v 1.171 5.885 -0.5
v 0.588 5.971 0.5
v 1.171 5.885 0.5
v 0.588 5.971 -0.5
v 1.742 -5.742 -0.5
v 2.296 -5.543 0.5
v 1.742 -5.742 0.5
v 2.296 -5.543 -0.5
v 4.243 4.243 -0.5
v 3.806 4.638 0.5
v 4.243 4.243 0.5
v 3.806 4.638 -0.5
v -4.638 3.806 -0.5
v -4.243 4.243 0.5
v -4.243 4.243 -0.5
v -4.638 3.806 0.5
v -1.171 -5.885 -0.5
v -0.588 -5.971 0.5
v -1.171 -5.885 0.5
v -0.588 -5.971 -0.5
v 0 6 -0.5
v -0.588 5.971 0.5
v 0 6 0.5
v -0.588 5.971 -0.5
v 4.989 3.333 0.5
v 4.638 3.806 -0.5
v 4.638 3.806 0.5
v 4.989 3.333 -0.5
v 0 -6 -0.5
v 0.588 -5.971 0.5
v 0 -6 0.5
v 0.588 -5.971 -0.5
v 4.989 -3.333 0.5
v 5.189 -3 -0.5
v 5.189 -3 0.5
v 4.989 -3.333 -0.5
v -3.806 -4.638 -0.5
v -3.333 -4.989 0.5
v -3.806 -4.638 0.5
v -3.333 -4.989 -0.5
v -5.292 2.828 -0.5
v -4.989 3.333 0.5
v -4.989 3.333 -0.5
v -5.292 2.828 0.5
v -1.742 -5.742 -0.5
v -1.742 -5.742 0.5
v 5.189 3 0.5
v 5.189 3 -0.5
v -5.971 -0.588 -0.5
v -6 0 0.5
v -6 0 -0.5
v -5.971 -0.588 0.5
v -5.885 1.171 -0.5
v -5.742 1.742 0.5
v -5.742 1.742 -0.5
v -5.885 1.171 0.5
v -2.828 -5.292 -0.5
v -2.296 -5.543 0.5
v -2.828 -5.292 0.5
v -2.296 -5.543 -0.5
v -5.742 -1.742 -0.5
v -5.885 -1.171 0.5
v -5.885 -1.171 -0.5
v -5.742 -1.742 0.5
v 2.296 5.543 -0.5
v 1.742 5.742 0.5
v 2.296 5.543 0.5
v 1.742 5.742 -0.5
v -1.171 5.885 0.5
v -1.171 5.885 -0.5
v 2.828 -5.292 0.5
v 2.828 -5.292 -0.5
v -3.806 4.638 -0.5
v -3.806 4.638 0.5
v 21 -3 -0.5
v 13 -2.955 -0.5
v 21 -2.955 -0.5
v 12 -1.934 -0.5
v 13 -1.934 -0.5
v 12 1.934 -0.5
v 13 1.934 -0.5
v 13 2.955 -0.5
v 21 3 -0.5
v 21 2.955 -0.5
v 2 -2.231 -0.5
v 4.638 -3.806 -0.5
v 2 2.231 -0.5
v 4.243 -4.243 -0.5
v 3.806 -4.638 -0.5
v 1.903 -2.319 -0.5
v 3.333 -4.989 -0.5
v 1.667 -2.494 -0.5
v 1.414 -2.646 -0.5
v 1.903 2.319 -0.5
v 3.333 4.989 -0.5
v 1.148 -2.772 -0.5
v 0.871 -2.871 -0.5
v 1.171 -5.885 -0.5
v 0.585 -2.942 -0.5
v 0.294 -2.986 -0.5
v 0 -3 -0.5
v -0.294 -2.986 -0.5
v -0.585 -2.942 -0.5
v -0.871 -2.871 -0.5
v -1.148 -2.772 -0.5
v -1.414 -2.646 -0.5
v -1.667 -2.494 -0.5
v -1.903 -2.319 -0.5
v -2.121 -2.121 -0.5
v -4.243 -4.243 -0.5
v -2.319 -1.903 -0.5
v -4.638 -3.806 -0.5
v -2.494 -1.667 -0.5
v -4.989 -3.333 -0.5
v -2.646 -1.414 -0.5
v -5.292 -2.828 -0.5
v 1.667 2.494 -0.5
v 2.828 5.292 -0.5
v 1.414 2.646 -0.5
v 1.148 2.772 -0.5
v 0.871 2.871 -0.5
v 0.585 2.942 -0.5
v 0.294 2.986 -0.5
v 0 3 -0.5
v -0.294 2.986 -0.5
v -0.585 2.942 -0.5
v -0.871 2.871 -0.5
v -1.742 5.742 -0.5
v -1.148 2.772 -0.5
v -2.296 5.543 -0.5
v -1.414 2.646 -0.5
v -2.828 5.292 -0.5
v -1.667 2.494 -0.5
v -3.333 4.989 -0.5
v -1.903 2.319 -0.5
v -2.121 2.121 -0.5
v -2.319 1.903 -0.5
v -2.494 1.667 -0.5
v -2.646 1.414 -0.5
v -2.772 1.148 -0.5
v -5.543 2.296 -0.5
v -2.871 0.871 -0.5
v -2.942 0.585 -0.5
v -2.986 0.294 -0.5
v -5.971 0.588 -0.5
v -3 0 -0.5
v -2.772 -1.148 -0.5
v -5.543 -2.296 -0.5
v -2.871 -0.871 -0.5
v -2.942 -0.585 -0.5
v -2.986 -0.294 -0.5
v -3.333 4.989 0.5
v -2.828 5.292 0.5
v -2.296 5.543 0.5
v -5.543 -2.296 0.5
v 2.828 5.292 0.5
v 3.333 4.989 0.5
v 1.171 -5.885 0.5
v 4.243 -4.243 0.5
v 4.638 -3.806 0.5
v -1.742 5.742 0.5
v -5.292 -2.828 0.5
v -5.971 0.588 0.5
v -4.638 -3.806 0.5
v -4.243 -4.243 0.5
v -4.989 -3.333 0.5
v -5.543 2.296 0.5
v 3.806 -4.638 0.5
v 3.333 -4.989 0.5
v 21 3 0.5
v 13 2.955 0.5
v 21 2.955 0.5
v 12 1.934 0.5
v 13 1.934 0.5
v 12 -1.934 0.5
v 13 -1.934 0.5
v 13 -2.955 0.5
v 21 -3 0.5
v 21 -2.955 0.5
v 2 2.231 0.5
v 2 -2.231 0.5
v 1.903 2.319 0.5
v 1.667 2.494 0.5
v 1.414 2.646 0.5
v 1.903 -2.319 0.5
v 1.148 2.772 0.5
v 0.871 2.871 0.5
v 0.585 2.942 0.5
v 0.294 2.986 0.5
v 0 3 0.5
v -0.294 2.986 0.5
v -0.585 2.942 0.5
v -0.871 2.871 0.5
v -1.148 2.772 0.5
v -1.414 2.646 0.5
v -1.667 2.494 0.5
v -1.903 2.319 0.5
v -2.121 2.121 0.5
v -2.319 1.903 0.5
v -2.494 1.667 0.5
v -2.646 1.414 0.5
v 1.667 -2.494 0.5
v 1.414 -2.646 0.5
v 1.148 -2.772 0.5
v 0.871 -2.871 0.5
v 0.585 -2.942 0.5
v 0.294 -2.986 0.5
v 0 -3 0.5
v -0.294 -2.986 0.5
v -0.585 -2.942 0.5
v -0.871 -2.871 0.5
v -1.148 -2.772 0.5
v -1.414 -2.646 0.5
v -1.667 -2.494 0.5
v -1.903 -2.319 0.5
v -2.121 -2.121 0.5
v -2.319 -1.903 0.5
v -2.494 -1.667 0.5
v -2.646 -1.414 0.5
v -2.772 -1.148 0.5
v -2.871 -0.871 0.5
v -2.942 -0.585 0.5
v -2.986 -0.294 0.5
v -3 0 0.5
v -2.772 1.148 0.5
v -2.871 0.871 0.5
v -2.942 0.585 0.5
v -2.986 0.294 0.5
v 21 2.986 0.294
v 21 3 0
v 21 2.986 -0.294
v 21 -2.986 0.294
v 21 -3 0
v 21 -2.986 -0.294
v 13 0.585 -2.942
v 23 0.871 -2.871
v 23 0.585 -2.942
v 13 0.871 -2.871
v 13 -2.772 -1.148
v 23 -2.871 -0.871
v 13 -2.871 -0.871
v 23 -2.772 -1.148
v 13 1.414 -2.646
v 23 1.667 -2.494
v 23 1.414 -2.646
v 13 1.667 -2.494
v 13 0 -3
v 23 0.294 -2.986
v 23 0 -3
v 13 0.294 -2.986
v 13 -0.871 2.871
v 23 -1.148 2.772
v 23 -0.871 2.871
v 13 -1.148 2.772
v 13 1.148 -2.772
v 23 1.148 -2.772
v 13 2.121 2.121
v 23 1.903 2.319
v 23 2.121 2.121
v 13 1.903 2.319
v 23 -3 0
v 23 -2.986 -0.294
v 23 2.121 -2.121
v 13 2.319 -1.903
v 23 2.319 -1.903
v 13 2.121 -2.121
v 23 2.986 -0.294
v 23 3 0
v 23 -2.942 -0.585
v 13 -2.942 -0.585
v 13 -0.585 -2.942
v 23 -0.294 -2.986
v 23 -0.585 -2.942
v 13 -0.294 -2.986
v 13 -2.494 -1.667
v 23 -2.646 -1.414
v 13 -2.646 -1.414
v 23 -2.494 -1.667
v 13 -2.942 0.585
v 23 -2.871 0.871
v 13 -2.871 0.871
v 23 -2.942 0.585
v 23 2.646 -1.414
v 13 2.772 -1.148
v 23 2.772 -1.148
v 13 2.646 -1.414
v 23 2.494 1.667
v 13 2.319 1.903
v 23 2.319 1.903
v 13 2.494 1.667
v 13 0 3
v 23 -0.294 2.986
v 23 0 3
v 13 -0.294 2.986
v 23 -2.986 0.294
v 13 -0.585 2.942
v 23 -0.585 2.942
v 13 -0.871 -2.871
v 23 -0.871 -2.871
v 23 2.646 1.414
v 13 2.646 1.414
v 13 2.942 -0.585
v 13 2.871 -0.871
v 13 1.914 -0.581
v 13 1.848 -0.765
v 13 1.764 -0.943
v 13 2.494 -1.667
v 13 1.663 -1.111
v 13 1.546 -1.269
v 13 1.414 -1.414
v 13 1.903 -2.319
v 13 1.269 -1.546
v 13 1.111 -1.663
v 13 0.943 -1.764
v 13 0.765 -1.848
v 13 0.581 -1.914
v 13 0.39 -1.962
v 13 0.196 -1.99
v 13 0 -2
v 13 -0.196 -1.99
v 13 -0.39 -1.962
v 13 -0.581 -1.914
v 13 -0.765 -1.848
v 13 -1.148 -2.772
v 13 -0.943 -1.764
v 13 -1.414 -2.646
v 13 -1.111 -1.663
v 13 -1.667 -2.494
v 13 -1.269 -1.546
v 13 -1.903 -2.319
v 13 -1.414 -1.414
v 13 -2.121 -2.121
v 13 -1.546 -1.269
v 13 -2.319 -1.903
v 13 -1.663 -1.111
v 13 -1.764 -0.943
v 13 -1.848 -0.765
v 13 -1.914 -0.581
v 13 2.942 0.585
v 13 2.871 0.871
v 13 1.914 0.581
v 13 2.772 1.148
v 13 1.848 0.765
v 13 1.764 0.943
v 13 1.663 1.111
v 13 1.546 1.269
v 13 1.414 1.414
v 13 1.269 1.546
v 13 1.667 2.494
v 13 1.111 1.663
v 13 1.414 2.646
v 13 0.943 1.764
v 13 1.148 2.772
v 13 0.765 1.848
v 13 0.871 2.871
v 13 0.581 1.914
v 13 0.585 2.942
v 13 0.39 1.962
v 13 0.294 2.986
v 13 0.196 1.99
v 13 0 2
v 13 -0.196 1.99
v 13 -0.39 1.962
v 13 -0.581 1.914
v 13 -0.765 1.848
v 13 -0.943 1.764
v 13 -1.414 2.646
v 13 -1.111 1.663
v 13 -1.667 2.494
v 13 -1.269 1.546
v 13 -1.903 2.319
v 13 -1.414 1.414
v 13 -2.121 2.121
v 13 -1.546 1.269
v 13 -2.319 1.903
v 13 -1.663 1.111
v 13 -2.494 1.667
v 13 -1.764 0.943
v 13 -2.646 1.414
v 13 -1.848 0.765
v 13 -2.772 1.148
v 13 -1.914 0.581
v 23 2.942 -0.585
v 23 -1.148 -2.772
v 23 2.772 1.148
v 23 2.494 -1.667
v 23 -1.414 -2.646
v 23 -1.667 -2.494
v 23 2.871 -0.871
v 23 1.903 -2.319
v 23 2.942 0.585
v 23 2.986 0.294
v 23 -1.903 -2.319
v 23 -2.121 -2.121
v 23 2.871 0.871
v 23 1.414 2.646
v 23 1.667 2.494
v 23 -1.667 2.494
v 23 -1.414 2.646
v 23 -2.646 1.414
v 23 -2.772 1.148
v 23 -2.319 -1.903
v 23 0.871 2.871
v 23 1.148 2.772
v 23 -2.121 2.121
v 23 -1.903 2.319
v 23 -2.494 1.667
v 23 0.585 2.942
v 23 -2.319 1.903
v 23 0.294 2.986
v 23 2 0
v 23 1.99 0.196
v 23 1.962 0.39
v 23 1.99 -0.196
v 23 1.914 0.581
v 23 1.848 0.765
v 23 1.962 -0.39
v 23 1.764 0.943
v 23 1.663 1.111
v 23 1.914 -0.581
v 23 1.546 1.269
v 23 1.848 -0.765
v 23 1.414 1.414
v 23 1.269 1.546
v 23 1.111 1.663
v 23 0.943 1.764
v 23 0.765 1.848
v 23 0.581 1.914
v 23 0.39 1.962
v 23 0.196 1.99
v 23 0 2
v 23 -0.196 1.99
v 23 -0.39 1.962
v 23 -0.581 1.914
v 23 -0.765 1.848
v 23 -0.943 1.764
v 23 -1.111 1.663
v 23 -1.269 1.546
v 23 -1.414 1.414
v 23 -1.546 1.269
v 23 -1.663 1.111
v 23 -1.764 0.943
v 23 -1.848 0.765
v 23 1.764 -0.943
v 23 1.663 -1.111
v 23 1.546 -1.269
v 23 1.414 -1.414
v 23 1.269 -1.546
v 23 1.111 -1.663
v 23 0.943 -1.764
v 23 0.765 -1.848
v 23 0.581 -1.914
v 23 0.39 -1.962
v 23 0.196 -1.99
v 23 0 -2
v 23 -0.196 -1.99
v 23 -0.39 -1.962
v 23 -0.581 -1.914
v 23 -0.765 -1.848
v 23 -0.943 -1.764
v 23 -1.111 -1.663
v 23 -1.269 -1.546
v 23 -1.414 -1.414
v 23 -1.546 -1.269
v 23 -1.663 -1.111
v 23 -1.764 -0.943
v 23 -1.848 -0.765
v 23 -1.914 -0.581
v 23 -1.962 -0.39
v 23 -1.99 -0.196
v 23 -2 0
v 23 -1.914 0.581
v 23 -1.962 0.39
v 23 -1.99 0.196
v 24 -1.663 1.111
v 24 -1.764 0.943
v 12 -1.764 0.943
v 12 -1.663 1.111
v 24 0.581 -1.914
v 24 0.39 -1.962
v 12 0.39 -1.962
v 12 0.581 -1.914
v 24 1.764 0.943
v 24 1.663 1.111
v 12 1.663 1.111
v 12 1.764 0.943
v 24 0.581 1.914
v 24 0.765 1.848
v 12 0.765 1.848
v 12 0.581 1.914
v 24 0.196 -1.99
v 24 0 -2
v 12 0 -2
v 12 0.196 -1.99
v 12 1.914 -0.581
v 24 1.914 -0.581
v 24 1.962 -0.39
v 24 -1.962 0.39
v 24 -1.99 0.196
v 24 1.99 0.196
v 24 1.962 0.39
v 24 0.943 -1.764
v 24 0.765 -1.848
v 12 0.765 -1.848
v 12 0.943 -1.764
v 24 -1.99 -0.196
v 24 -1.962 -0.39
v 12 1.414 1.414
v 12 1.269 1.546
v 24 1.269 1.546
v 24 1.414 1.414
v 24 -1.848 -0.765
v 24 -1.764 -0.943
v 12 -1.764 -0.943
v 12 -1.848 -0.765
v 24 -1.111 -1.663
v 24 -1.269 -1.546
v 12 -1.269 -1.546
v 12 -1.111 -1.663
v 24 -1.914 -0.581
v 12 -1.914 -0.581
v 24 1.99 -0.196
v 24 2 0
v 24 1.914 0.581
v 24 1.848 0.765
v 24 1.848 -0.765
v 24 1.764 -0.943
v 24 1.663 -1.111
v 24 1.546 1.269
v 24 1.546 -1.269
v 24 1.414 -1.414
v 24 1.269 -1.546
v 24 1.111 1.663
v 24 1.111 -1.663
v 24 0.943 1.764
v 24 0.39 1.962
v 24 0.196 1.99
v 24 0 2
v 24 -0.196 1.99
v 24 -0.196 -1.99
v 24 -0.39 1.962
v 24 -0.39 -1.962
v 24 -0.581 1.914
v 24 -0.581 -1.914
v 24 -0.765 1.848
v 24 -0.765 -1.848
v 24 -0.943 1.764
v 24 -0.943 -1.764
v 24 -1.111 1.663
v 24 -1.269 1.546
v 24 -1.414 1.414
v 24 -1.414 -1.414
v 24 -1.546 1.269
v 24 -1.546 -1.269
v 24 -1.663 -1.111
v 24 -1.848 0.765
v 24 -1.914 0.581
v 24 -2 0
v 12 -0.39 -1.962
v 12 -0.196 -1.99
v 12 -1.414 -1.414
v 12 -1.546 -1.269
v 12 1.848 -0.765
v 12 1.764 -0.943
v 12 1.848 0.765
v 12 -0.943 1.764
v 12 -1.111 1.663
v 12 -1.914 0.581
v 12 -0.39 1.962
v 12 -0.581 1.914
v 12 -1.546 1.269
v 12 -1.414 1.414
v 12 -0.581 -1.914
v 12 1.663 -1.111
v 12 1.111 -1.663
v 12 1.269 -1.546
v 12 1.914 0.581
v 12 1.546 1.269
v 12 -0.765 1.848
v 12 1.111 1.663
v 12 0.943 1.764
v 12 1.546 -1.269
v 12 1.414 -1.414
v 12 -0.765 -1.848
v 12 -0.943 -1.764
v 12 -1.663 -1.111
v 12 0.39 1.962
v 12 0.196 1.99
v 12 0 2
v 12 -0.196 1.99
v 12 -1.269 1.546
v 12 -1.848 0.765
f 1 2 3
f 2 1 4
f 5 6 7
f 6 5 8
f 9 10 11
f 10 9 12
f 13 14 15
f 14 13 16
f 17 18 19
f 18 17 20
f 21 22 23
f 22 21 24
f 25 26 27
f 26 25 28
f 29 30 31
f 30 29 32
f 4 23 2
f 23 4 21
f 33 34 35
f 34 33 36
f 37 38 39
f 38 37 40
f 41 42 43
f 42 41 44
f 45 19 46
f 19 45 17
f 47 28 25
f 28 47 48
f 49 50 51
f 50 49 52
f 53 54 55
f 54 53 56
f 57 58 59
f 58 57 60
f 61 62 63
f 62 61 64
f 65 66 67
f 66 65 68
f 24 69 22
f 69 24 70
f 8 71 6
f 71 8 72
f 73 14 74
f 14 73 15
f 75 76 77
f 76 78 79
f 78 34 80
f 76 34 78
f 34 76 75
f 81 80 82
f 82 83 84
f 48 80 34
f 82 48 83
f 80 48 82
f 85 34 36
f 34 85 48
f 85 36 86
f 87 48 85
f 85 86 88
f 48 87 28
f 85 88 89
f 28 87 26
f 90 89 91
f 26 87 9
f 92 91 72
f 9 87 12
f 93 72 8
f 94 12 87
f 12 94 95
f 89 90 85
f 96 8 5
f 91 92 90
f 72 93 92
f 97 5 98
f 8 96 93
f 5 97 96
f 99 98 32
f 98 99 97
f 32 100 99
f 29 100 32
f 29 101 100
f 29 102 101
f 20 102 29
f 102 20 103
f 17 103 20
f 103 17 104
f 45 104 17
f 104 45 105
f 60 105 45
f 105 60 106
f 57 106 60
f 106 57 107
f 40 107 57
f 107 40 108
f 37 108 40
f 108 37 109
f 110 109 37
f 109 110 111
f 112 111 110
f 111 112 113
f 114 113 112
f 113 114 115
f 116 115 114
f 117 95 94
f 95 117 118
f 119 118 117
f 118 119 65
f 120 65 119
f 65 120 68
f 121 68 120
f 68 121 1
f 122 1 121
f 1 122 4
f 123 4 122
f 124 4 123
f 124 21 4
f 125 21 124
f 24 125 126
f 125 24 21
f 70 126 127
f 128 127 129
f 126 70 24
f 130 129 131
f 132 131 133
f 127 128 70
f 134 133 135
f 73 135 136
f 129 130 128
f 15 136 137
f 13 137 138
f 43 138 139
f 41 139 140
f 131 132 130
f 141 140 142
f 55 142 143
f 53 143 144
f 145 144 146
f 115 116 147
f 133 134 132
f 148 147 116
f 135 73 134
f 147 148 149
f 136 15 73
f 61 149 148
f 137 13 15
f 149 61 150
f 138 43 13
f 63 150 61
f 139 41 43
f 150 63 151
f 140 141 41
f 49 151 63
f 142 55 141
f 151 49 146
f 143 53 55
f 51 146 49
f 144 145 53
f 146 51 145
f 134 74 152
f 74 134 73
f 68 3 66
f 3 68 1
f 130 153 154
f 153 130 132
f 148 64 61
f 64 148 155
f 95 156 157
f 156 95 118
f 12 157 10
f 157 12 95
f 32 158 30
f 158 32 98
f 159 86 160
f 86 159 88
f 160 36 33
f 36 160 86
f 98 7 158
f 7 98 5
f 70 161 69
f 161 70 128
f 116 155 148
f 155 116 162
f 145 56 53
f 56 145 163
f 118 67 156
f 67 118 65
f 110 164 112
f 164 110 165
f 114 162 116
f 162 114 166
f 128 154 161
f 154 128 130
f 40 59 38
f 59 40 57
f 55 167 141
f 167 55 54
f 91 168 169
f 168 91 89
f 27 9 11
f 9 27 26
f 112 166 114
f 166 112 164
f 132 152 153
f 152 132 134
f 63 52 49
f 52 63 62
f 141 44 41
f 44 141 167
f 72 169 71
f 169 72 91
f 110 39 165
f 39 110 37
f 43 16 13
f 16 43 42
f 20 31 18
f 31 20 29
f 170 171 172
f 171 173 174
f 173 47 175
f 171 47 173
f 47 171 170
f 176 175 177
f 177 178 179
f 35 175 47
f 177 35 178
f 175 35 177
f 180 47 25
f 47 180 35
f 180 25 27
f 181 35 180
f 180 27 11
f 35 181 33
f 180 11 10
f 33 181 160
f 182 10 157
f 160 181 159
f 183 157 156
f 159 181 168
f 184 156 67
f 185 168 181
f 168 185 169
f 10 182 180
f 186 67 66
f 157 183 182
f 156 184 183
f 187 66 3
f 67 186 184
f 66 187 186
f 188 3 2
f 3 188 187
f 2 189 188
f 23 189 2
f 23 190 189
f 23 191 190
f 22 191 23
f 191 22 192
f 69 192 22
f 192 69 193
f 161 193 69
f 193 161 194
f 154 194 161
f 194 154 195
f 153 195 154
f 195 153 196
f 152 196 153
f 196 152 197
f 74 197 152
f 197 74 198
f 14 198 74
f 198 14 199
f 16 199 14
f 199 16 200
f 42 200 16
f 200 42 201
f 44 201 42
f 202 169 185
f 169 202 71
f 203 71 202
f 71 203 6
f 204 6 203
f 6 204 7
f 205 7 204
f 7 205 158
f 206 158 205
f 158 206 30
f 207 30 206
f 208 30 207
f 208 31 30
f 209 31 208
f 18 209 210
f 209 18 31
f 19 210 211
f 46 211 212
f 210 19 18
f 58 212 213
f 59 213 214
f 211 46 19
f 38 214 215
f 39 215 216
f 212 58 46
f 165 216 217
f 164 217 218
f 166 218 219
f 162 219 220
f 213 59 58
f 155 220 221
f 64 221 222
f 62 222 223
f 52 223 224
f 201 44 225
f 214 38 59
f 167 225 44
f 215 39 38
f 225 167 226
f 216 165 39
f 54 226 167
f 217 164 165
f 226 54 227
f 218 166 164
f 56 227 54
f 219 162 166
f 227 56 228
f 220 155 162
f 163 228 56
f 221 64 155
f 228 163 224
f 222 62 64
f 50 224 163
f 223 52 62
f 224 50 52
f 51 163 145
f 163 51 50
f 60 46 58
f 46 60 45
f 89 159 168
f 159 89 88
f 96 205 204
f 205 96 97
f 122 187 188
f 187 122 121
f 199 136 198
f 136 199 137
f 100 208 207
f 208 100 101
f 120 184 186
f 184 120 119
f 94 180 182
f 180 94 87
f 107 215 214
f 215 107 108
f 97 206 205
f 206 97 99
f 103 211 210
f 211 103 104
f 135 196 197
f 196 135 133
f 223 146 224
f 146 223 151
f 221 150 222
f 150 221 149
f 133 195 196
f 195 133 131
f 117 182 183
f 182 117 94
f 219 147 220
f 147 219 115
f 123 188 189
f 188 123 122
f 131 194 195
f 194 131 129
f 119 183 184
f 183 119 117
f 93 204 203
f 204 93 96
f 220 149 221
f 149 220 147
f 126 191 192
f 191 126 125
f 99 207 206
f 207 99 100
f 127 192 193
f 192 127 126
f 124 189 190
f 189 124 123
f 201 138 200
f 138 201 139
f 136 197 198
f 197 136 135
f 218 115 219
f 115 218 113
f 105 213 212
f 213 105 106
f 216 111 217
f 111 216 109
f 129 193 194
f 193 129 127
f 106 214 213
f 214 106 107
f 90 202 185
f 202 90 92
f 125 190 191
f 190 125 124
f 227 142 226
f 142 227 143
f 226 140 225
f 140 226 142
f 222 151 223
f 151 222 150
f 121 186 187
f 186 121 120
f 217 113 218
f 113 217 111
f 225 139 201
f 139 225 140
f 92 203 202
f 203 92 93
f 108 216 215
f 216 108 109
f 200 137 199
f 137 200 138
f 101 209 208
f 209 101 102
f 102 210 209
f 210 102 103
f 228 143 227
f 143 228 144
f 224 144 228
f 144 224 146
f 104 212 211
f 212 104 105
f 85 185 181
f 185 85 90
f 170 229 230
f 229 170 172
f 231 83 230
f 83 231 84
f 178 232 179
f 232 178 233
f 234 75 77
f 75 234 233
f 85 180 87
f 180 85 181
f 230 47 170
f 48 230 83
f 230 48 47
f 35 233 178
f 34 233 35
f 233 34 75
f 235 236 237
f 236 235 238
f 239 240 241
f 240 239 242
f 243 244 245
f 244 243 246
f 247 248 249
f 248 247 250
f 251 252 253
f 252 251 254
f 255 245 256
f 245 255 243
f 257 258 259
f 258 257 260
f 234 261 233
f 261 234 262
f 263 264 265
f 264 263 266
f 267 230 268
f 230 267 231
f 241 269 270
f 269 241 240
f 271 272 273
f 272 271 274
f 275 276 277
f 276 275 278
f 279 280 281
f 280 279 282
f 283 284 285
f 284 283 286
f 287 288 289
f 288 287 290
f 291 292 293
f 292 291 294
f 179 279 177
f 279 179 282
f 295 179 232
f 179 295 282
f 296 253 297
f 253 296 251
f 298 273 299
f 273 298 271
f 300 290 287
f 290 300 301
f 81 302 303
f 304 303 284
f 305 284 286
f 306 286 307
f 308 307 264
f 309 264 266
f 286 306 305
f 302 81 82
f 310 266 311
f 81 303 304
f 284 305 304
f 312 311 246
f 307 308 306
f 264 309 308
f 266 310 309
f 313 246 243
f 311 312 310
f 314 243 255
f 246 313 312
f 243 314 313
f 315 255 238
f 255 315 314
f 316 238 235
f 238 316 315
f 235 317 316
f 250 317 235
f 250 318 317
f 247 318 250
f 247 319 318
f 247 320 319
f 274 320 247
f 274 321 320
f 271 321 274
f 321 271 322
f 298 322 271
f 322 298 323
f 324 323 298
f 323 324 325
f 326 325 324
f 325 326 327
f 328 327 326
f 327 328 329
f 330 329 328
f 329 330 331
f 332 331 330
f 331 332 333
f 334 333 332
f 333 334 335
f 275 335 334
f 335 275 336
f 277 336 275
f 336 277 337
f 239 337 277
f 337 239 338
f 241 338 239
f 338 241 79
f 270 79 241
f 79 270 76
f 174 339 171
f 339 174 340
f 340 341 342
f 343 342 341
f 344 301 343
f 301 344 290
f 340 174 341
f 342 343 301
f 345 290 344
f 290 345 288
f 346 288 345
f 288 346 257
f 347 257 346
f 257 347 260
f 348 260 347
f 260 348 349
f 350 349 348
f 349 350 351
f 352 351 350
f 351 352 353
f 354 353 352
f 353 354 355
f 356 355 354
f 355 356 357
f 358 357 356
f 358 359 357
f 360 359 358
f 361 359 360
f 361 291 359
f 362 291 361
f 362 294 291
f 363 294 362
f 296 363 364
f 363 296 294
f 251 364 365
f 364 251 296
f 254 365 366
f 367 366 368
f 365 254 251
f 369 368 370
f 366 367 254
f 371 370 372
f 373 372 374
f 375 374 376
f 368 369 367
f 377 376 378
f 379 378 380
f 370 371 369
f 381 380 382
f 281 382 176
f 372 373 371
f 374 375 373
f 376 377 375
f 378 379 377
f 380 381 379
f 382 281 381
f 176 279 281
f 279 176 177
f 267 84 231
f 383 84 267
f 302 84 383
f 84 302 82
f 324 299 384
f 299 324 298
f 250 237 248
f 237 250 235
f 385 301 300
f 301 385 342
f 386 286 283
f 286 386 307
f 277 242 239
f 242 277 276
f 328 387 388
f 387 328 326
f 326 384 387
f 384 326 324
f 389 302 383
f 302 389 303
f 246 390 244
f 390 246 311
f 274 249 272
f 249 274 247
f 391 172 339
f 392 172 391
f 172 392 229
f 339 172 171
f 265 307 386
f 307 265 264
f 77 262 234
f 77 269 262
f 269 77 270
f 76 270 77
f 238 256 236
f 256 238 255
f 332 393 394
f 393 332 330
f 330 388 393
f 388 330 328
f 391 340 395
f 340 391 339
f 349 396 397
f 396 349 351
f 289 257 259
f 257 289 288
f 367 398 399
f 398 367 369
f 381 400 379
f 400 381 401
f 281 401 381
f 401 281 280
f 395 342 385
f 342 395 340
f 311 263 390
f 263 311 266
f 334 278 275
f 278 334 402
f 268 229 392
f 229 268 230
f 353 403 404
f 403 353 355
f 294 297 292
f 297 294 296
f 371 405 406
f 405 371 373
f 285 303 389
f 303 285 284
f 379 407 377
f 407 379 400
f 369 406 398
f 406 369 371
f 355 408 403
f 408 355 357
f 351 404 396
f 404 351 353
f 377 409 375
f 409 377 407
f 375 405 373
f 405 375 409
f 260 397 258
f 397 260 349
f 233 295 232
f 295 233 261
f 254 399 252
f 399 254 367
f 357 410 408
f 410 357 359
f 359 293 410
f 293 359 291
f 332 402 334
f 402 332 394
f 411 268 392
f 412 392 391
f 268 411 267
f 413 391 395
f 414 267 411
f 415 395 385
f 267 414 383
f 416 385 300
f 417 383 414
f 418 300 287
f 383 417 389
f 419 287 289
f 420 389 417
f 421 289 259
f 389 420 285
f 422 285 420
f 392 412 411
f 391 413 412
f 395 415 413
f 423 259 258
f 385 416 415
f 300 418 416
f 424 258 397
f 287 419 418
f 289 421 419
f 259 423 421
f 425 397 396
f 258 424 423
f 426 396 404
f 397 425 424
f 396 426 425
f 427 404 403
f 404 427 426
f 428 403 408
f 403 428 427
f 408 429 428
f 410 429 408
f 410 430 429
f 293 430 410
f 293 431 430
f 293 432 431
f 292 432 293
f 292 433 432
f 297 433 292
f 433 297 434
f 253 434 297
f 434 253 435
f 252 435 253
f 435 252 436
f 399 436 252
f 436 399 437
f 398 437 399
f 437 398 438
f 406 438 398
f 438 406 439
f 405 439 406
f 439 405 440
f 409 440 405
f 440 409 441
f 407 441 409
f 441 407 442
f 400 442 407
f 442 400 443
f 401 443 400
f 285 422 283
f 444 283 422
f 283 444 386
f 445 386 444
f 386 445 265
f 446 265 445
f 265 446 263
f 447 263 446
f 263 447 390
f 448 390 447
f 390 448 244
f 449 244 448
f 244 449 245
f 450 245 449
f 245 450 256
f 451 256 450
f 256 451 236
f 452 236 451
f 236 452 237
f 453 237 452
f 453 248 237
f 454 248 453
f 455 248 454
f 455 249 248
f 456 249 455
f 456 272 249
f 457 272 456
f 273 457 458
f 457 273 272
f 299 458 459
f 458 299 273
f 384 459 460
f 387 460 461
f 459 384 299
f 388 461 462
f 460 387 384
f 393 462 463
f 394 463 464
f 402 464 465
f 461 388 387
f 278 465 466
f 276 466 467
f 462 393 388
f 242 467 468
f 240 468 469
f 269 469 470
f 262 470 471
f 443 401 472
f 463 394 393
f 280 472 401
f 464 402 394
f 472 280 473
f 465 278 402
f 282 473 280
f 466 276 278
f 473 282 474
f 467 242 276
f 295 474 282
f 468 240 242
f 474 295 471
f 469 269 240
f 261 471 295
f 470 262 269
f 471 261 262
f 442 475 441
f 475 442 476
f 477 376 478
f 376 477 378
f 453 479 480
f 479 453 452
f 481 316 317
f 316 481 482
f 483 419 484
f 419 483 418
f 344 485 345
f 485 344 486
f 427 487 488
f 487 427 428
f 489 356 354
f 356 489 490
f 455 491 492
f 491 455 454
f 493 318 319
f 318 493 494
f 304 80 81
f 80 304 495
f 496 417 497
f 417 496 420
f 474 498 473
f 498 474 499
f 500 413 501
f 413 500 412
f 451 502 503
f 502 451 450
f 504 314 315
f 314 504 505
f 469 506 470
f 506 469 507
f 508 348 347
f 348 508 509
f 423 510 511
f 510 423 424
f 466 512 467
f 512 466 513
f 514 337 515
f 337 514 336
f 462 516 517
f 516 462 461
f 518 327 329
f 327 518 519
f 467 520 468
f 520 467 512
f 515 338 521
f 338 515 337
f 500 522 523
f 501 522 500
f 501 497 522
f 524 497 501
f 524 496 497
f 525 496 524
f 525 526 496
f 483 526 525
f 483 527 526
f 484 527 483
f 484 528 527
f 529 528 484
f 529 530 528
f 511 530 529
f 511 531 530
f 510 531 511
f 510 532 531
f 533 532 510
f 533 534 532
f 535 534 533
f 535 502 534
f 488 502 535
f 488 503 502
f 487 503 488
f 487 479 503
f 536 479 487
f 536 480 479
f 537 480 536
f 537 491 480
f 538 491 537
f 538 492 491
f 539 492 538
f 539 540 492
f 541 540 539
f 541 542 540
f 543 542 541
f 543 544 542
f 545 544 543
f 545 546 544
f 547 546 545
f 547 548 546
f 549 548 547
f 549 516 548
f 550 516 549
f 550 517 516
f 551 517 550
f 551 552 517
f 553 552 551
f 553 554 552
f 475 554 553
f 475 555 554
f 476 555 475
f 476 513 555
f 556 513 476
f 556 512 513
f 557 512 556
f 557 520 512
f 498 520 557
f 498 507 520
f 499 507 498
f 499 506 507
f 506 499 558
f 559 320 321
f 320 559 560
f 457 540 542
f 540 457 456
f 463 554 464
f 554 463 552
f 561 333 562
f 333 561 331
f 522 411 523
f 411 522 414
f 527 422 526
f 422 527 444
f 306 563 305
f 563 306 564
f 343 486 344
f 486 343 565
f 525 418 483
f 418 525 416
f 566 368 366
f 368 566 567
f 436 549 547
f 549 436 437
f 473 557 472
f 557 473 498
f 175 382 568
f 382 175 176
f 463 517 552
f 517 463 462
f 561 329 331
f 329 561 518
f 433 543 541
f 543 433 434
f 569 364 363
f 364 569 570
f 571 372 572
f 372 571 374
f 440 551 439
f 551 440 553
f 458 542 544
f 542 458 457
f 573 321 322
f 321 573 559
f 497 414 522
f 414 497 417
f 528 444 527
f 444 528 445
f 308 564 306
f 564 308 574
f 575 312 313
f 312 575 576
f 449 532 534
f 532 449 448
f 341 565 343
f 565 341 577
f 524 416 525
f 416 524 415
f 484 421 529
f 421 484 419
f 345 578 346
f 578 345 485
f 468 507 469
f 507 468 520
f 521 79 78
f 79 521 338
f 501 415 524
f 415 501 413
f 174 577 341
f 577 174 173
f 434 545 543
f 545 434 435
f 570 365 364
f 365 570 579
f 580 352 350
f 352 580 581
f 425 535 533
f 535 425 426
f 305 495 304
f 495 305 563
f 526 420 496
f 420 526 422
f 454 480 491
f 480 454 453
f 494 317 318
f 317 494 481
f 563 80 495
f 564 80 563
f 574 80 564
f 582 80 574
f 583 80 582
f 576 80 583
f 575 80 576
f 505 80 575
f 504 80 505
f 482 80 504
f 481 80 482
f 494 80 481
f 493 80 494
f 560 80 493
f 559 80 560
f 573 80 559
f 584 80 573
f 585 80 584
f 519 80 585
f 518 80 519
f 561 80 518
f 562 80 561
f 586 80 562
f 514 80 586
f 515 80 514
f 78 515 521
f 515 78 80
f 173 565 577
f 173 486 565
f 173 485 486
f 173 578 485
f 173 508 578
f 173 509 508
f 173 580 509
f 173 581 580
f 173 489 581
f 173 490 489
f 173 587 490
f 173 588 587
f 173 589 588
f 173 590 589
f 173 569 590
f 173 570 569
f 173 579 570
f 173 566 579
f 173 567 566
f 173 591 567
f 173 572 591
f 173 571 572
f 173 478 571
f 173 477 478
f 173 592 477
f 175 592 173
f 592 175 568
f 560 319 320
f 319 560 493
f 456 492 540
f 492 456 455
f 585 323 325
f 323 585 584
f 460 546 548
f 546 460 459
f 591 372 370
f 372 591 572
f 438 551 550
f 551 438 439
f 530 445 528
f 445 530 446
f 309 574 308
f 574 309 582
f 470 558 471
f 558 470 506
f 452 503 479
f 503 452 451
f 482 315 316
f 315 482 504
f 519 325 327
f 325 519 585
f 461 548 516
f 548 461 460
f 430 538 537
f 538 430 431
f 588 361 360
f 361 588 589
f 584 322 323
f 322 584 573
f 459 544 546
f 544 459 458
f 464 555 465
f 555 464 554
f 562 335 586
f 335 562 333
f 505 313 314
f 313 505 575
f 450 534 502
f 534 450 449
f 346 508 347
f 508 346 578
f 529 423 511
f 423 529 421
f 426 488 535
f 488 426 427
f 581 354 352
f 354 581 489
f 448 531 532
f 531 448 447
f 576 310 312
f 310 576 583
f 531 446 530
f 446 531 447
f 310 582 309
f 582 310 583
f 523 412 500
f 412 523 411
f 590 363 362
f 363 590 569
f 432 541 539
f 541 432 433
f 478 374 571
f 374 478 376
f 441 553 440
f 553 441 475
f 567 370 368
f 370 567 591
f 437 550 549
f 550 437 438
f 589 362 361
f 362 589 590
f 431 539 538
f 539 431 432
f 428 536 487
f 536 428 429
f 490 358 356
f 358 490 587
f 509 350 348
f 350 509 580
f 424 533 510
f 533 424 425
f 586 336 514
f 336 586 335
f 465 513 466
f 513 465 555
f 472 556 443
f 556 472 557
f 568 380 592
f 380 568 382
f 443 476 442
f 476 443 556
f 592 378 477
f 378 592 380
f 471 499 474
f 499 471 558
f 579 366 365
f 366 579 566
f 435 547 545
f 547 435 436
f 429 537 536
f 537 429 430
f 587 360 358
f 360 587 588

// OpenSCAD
// Parameters
ring_outer_diameter = 12; //[6:24:1]
ring_inner_diameter = 6; //[3:12:1]
thickness = 1; //[0.5:2:0.1]
lug_width = 6; //[3:12:1]
overall_length = 25; //[15:50:1]
has_crimp_barrel = 1; //[0:1:1]
crimp_length = 10; //[5:25:1]
crimp_outer_diameter = 6; //[3:12:1]
crimp_inner_diameter = 4; //[2:10:1]
bend_angle_deg = 45; //[0:75:1]
transition_length = 1; //[0.5:3:0.5]
overlap = 1; //[0.5:2:0.5]

// Ring Terminal - complete geometry
module ring_terminal() {
  color("Silver") {
    difference() {
      // Ring Lug Body
      translate([0, 0, 0])
        cylinder(r=ring_outer_diameter/2, h=thickness, center=true, $fn=64);
      // Fastener Hole
      translate([0, 0, 0])
        cylinder(r=ring_inner_diameter/2, h=thickness + 2*overlap, center=true, $fn=64);
    }
  }
}

// Ring Terminal Assembly - complete geometry
module ring_terminal_assembly() {
  color("Silver") {
    union() {
      // Ring Terminal
      ring_terminal();
      // Tongue Extension
      translate([ring_outer_diameter/4 + (overall_length - ring_outer_diameter/2)/2 - overlap, 0, 0])
        cube([overall_length - ring_outer_diameter/2, lug_width, thickness], center=true);
      // Crimp Barrel or Bent Tongue Transition
      if (has_crimp_barrel) {
        translate([ring_outer_diameter/4 + (overall_length - ring_outer_diameter/2) - crimp_length/2 + overlap, 0, 0])
          rotate([0, 90, 0])
          cylinder(r=crimp_outer_diameter/2, h=crimp_length, center=true, $fn=64);
      }
    }
    // Crimp Barrel Inner Void
    if (has_crimp_barrel) {
      translate([ring_outer_diameter/4 + (overall_length - ring_outer_diameter/2) - crimp_length/2 + overlap, 0, 0])
        rotate([0, 90, 0])
        cylinder(r=crimp_inner_diameter/2, h=crimp_length + 2*overlap, center=true, $fn=64);
    }
  }
}

// Assembly
module assembly() {
  ring_terminal_assembly();
}

assembly();
